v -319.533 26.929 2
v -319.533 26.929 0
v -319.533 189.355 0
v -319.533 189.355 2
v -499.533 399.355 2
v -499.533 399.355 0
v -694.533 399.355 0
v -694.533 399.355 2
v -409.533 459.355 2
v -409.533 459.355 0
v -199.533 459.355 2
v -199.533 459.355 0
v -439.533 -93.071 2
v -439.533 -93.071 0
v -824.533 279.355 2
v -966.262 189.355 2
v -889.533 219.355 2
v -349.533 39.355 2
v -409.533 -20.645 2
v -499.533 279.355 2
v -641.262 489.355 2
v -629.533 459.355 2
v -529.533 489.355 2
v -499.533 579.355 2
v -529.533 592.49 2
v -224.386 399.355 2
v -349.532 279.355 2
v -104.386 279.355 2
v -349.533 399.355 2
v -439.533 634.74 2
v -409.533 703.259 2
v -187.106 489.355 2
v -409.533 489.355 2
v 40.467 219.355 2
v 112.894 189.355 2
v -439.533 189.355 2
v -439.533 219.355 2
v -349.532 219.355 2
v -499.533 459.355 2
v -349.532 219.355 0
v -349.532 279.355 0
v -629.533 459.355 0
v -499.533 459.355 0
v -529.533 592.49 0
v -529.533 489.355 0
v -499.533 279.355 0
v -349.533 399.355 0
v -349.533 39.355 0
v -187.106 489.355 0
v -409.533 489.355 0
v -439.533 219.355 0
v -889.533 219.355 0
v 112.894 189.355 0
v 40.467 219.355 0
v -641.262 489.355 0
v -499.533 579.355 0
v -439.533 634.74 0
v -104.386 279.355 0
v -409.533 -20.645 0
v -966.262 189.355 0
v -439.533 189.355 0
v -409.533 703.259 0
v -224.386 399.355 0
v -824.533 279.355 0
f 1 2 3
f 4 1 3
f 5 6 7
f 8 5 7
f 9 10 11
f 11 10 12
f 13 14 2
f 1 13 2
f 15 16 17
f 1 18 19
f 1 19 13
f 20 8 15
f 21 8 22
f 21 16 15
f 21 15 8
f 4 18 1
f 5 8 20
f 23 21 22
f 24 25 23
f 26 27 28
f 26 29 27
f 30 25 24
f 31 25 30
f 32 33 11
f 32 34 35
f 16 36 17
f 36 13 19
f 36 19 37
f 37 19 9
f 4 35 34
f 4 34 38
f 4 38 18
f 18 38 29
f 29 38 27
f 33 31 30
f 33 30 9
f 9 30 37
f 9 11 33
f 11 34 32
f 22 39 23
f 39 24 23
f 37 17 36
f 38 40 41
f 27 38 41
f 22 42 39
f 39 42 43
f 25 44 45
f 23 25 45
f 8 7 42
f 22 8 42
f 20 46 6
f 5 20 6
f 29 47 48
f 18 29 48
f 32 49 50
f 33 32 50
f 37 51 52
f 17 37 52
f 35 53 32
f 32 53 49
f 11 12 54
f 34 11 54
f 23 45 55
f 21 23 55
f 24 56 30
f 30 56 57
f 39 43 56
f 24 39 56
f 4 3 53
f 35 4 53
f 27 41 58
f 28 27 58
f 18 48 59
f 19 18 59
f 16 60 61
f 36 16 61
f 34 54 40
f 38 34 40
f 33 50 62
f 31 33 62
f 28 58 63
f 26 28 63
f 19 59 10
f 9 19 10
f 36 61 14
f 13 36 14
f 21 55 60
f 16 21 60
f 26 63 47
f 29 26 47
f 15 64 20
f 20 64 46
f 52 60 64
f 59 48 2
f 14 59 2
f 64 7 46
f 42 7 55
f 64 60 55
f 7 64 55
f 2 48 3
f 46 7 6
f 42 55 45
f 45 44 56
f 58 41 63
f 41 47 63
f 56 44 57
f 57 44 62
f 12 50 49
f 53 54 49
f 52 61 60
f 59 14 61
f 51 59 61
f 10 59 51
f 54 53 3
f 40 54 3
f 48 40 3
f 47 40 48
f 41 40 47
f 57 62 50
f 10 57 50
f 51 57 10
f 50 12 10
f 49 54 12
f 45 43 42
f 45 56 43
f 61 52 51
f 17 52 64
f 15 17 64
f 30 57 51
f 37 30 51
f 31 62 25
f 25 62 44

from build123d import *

# Parameters (mm, degrees)
F0_W     = 0.001
F0_H     = 60
F1_DEPTH = 2


with BuildPart() as f1:
    # F0 (on Top) → F1 (new body)
    with BuildSketch(Plane.XY):
        Polygon((-409.5329046249, 489.3550023332), (-409.5329046249, 703.2591700554), (-439.5329046249, 675.5668623631), (-439.5329046249, 634.7396177178), (-439.5329046249, 219.3550023332), (-439.5329046249, 189.3550023332), (-439.5329046249, -93.071404538), (-409.5329046249, -63.071404538), (-409.5329046249, -20.6449976668), (-409.5329046249, 189.3550023332), (-409.5329046249, 279.3550023332), (-409.5329046249, 399.3550023332), (-409.5329046249, 459.3550023332), align=None)
        Polygon((-187.1064977537, 489.3550023332), (-409.5329046249, 489.3550023332), (-409.5329046249, 459.3550023332), (-199.5329046249, 459.3550023332), (-157.1064977537, 459.3550023332), align=None)
        Polygon((-439.5329046249, 634.7396177178), (-439.5329046249, 675.5668623631), (-499.5329046249, 620.1822469785), (-499.5329046249, 579.3550023332), align=None)
        Polygon((-499.5329046249, 579.3550023332), (-499.5329046249, 620.1822469785), (-529.5329046249, 592.4899392862), (-529.5329046249, 551.6626946409), align=None)
        Polygon((-157.1064977537, 459.3550023332), (-199.5329046249, 459.3550023332), (-139.5329046249, 399.3550023332), (40.4670953751, 219.3550023332), (-44.3857183673, 219.3550023332), (-349.5319046249, 219.3550023332), (-349.5329046249, 219.3550023332), (-349.5329046249, 189.3550023332), (-319.5329046249, 189.3550023332), (112.8935022463, 189.3550023332), align=None)
        Polygon((-439.5329046249, 189.3550023332), (-439.5329046249, 219.3550023332), (-889.5329046249, 219.3550023332), (-922.0329046249, 189.3550023332), align=None)
        Polygon((-499.5329046249, 459.3550023332), (-499.5329046249, 579.3550023332), (-529.5329046249, 551.6626946409), (-529.5329046249, 489.3550023332), (-597.0329046249, 489.3550023332), (-629.5329046249, 459.3550023332), align=None)
        Polygon((-224.3857183673, 399.3550023332), (-349.5329046249, 399.3550023332), (-349.5329046249, 279.3550023332), (-349.5319046249, 279.3550023332), (-104.3857183673, 279.3550023332), align=None)
        Polygon((-922.0329046249, 189.3550023332), (-889.5329046249, 219.3550023332), (-933.7624196573, 219.3550023332), (-966.2624196573, 189.3550023332), align=None)
        Polygon((-933.7624196573, 219.3550023332), (-889.5329046249, 219.3550023332), (-824.5329046249, 279.3550023332), (-868.7624196573, 279.3550023332), align=None)
        Polygon((-597.0329046249, 489.3550023332), (-641.2624196573, 489.3550023332), (-673.7624196573, 459.3550023332), (-629.5329046249, 459.3550023332), align=None)
        with Locations((-349.5324046249, 249.3550023332)):
            Rectangle(F0_W, F0_H)
        Polygon((-319.5329046249, 26.928595462), (-319.5329046249, 189.3550023332), (-349.5329046249, 189.3550023332), (-349.5329046249, 39.3550023332), (-349.5329046249, -3.071404538), align=None)
        Polygon((-694.5329046249, 399.3550023332), (-824.5329046249, 279.3550023332), (-499.5329046249, 279.3550023332), (-499.5329046249, 399.3550023332), align=None)
        Polygon((-868.7624196573, 279.3550023332), (-824.5329046249, 279.3550023332), (-694.5329046249, 399.3550023332), (-738.7624196573, 399.3550023332), align=None)
        Polygon((-694.5329046249, 399.3550023332), (-629.5329046249, 459.3550023332), (-673.7624196573, 459.3550023332), (-738.7624196573, 399.3550023332), align=None)
        Polygon((-349.5329046249, 39.3550023332), (-409.5329046249, -20.6449976668), (-409.5329046249, -63.071404538), (-349.5329046249, -3.071404538), align=None)
    extrude(amount=F1_DEPTH)


solid = f1.part
